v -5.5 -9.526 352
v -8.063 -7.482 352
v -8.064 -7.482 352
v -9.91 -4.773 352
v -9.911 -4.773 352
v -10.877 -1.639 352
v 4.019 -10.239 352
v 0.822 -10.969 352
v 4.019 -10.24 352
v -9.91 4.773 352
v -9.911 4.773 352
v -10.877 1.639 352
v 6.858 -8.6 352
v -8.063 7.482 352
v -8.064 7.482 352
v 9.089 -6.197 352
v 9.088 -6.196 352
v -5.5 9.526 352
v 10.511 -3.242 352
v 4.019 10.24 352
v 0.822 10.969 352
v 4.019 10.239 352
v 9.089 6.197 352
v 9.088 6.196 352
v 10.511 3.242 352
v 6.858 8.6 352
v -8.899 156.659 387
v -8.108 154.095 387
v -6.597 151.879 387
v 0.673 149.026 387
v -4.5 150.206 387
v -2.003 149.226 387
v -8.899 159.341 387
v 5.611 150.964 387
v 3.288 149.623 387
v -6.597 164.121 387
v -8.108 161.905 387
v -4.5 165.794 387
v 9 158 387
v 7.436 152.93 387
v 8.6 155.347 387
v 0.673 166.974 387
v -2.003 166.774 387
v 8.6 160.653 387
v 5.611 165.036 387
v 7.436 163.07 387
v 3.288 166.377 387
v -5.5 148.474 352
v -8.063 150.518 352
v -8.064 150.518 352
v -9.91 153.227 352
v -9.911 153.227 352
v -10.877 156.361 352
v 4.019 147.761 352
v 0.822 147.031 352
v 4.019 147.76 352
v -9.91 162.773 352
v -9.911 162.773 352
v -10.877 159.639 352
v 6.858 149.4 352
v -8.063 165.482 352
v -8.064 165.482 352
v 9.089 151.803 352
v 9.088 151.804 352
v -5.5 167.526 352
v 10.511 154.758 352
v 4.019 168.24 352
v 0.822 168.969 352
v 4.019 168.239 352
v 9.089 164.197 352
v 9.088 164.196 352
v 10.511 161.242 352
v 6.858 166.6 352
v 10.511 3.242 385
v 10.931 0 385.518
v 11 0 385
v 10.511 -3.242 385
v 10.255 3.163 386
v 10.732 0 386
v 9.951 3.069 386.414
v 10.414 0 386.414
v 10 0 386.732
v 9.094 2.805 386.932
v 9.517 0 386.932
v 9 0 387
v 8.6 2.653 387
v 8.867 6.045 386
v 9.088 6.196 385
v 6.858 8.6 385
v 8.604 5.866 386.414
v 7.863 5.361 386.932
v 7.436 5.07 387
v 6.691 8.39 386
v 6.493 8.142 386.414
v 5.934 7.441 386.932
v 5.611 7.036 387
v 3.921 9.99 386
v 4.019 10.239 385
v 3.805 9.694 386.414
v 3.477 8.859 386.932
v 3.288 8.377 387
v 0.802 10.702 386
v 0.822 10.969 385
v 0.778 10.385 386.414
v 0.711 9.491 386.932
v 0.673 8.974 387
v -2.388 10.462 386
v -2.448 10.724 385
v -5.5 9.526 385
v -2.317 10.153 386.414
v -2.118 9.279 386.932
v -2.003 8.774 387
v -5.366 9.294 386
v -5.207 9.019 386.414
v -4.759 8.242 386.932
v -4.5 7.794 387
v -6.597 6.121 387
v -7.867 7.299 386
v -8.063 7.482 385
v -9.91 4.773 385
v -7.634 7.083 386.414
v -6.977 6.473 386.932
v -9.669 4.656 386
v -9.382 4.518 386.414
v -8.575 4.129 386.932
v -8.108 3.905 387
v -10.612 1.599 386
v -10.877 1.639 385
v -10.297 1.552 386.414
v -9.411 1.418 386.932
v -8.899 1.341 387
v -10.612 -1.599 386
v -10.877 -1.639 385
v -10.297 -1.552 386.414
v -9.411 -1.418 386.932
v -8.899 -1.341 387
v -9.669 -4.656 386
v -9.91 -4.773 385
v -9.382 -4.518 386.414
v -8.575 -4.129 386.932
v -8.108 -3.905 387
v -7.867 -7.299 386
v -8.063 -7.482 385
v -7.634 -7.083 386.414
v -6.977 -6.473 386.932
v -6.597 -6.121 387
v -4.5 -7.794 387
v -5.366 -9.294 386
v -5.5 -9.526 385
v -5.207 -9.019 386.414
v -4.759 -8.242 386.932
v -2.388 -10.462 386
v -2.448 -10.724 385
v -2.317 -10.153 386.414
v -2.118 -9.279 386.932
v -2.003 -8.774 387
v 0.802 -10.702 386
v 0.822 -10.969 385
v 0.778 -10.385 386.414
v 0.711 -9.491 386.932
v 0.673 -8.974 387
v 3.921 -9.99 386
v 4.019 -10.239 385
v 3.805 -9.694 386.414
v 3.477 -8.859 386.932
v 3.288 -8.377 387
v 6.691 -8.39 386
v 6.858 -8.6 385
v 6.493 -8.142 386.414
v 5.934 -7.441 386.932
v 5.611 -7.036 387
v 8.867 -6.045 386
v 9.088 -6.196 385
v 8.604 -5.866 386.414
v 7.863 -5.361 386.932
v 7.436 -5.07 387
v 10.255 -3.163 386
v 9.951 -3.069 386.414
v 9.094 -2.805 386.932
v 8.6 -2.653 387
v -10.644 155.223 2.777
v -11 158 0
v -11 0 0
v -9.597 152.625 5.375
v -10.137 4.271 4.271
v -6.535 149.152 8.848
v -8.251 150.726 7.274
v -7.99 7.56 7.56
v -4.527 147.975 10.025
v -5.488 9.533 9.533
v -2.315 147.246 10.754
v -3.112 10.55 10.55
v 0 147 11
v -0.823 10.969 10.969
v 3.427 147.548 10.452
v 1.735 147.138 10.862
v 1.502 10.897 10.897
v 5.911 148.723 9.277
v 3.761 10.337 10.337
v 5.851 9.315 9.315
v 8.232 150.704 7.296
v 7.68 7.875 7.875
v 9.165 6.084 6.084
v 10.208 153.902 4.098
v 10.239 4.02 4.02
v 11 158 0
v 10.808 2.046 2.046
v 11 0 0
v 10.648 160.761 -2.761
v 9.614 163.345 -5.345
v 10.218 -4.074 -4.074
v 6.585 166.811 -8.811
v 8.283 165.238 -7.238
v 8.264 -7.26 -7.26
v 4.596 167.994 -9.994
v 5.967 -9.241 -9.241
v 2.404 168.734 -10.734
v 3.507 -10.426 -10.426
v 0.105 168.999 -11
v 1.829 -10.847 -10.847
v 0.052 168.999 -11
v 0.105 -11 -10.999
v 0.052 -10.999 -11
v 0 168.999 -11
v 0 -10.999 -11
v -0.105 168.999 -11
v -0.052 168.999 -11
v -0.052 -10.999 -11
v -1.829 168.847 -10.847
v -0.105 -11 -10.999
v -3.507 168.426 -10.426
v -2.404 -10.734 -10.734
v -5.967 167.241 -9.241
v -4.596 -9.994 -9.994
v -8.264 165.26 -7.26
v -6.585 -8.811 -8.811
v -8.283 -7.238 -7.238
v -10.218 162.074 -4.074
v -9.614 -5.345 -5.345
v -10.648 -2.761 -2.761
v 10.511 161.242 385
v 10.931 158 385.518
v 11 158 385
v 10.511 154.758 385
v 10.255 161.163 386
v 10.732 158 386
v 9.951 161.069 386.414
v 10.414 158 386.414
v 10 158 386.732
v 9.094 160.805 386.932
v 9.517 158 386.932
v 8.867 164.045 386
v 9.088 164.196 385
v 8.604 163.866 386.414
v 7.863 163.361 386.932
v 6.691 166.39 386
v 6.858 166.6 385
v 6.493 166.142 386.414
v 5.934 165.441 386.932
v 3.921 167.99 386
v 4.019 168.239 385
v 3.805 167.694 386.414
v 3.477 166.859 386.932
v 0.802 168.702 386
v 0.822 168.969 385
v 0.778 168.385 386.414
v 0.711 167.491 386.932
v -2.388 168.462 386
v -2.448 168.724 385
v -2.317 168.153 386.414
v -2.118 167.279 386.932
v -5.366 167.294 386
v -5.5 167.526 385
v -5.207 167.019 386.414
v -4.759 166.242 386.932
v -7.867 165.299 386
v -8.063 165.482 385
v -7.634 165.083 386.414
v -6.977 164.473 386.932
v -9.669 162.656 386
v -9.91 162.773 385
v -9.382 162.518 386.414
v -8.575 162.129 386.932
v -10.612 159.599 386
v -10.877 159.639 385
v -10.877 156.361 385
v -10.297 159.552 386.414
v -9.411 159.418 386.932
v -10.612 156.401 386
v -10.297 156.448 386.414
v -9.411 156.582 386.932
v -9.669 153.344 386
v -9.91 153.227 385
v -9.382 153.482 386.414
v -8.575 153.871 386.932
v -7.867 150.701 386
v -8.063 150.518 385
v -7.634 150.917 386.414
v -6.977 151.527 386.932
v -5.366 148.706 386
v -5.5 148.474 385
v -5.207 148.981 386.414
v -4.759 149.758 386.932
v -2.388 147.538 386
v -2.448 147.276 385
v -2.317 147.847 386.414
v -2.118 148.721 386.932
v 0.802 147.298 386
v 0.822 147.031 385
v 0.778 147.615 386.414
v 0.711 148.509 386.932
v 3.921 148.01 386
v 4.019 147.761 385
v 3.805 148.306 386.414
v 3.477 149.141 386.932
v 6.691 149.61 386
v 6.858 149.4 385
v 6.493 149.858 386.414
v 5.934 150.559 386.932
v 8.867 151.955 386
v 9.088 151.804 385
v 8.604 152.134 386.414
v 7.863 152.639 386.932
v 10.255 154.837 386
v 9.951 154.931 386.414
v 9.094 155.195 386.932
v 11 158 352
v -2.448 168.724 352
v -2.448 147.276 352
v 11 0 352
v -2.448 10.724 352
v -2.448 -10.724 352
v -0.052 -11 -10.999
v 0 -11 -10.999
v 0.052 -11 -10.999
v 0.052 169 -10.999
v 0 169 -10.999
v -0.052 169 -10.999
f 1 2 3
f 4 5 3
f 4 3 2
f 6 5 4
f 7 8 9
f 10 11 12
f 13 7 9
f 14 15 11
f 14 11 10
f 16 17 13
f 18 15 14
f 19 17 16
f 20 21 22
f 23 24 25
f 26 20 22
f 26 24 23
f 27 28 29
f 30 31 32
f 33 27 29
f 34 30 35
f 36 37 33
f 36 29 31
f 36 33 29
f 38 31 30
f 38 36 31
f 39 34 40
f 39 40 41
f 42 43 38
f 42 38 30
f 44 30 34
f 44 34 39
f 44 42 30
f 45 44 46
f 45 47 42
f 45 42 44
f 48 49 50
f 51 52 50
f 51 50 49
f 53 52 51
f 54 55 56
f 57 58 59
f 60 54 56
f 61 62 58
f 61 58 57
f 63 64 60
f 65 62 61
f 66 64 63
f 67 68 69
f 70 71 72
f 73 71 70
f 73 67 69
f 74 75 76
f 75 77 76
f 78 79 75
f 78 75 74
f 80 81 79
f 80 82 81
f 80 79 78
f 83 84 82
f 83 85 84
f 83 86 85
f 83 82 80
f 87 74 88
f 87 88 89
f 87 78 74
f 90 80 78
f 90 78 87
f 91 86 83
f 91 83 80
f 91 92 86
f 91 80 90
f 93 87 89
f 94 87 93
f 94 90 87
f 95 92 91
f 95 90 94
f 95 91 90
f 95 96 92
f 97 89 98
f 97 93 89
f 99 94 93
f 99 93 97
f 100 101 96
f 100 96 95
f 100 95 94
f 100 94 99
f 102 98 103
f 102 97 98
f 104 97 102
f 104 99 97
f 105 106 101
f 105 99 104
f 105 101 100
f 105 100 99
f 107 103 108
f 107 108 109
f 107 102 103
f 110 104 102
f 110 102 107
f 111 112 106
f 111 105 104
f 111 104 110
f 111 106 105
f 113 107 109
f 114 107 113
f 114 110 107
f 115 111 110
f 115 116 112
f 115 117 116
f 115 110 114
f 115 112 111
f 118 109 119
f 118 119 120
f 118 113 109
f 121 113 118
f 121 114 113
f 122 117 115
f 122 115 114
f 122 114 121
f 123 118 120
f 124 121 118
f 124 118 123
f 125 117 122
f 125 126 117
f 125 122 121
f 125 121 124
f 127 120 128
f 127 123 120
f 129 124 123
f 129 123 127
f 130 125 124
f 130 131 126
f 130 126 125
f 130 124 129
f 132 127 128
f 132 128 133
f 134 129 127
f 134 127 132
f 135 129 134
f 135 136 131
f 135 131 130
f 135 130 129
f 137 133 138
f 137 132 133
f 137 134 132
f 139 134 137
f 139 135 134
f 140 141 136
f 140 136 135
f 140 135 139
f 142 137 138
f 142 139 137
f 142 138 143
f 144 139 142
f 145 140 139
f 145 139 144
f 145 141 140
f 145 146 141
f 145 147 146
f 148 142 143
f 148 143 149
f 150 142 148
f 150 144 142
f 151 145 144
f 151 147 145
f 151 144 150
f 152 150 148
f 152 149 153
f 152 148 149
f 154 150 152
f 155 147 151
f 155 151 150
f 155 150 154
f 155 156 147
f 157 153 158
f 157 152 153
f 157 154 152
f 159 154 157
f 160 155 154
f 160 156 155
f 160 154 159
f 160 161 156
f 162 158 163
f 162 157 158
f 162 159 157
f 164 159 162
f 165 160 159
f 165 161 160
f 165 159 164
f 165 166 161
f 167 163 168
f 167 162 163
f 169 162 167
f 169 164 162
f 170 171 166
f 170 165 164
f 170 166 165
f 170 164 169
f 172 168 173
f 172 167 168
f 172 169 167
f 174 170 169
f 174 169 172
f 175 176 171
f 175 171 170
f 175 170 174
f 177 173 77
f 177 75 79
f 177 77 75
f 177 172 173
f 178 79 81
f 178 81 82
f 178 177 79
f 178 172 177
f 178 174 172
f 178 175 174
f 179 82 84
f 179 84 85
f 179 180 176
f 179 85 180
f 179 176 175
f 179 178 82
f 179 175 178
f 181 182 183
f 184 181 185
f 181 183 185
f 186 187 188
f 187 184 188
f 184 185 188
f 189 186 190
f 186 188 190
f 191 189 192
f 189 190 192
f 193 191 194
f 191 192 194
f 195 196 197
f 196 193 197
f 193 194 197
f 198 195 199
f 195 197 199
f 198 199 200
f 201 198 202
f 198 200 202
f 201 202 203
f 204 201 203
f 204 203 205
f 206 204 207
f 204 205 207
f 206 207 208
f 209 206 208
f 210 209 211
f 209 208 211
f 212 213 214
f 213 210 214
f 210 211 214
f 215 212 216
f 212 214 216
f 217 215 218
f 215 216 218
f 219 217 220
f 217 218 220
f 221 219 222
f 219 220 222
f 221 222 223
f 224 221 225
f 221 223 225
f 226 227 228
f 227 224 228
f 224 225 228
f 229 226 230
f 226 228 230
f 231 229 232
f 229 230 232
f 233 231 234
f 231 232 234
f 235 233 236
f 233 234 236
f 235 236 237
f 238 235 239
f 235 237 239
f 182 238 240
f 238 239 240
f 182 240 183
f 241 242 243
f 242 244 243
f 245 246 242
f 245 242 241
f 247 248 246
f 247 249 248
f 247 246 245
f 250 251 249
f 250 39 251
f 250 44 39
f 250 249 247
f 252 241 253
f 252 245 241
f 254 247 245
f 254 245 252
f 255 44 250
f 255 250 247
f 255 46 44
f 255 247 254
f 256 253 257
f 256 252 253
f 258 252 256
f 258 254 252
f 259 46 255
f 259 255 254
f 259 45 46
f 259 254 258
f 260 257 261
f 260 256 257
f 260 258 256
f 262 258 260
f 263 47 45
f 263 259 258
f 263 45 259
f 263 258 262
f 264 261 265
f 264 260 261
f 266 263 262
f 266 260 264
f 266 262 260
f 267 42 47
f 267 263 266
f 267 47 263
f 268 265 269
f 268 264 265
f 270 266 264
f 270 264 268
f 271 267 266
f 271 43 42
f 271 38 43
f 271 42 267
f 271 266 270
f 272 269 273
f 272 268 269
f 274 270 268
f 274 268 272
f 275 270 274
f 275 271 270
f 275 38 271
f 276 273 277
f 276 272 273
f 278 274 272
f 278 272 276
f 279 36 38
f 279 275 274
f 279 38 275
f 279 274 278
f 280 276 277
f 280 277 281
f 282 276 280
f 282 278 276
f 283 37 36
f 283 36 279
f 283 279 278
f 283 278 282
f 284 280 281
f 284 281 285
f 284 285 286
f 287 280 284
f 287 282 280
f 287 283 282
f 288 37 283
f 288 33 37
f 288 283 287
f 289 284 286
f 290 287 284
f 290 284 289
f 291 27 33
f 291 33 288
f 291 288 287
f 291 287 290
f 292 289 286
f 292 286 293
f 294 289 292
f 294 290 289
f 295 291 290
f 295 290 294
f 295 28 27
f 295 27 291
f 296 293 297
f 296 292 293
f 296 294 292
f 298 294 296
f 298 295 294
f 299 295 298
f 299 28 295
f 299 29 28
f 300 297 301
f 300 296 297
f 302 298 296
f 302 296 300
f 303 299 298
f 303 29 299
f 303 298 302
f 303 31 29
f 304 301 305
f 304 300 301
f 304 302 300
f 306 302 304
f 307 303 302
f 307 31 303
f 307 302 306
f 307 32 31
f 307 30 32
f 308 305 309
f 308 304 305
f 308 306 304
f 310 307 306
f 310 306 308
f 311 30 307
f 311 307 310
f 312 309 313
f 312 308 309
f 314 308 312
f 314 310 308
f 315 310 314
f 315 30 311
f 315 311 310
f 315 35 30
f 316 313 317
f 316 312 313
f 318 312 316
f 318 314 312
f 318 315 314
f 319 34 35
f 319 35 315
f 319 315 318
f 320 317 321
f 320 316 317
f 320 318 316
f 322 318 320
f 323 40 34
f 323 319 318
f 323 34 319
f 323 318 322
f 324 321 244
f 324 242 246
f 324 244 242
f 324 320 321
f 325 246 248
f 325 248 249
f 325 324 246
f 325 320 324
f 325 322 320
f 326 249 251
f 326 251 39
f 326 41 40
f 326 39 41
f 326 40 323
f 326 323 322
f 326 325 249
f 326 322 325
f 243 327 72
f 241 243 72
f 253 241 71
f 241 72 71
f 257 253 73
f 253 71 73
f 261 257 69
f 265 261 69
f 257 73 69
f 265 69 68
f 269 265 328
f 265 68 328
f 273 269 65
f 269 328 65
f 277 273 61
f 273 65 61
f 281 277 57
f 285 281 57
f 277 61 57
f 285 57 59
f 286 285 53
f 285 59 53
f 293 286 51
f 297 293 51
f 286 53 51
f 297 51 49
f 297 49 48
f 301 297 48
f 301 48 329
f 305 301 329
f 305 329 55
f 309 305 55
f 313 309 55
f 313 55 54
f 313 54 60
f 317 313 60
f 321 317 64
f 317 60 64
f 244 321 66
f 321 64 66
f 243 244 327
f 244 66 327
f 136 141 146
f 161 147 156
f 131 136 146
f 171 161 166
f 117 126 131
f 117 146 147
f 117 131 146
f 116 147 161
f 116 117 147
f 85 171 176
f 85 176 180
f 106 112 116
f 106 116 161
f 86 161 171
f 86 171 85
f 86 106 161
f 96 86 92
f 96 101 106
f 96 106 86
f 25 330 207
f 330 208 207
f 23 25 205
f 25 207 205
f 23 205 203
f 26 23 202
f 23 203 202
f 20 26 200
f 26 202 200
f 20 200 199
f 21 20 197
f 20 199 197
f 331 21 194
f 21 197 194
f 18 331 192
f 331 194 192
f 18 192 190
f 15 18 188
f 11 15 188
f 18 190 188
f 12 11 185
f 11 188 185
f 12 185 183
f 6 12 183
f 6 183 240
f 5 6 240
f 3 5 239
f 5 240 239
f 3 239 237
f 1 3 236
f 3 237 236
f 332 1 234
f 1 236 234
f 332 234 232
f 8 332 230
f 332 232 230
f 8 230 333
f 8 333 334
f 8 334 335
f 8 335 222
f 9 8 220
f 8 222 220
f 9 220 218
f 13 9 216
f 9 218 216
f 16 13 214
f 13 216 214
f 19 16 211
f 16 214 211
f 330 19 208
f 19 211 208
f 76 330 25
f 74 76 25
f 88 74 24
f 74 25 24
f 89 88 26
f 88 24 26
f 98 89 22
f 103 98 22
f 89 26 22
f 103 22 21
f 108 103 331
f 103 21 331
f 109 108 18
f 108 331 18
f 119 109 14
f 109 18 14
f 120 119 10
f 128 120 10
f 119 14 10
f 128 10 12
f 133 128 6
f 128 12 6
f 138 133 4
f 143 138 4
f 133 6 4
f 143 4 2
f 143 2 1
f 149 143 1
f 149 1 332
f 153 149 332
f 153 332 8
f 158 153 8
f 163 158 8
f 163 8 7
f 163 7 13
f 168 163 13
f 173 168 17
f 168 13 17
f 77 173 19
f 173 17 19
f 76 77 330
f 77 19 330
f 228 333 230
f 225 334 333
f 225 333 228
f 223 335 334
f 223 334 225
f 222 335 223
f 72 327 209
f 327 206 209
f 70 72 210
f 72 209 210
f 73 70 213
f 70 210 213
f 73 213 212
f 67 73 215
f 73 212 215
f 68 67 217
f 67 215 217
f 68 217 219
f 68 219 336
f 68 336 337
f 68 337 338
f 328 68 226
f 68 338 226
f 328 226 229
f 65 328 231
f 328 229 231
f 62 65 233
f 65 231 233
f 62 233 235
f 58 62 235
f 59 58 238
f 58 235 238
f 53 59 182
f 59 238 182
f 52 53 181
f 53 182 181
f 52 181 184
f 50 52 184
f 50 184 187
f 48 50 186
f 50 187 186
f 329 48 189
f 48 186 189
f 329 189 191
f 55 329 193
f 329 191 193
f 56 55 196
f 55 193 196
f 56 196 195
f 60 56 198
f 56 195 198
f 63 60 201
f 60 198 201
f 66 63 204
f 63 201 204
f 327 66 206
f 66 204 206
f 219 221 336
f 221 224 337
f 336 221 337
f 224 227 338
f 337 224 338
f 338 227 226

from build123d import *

# Parameters (mm, degrees)
SKETCH_1_R                 = 11
EXTRUDE_1_DEPTH            = 352
SKETCH_2_R                 = 11
EXTRUDE_2_DEPTH            = 158
PATTERN_LINEAR_1_OUTLINE_R = 11
PATTERN_LINEAR_1_DEPTH     = 352
SKETCH_3_R                 = 10.9995
EXTRUDE_3_DEPTH            = 35
CHAMFER_1_SIZE             = 21.999
FILLET_1_R                 = 2


with BuildPart() as part:
    # 草图1 → 拉伸1 (new body)
    with BuildSketch(Plane.XY):
        Circle(SKETCH_1_R)
    extrude(amount=EXTRUDE_1_DEPTH)

    # 草图2 → 拉伸2 (add)
    with BuildSketch(Plane(origin=(0, 0, 0), x_dir=(1, 0, 0), z_dir=(0, 1, 0))):
        with Locations(Location((0, 0, 0), (0, 0, 180))):
            Circle(SKETCH_2_R)
    extrude(amount=EXTRUDE_2_DEPTH)


with BuildPart() as pattern_linear_1_tool:
    # 阵列(线性)1: read off the stored shape, not the designer's step
    # 阵列(线性)1 outline → 阵列(线性)1 (new body)
    with BuildSketch(Plane.XY):
        with Locations((0, 158)):
            Circle(PATTERN_LINEAR_1_OUTLINE_R)
    extrude(amount=PATTERN_LINEAR_1_DEPTH)


with BuildPart() as part_1:
    add(part.part)


with BuildPart() as part_2:
    # 阵列(线性)1: joined with pattern_linear_1_tool
    add(part_1.part.fuse(pattern_linear_1_tool.part, tol=0.00001))

    # 草图3 → 拉伸3 (add)
    with BuildSketch(Plane.XY.offset(352)):
        with Locations((0, 158)):
            Circle(SKETCH_3_R)
        Circle(SKETCH_3_R)
    extrude(amount=EXTRUDE_3_DEPTH)

    # 倒角1
    # the kernel refuses this chamfer: 21.999 mm, written as the material it adds along each edge
    with BuildSketch(Plane(origin=(67.574454052, 0, 0), x_dir=(0, -1, 0), z_dir=(-1, 0, 0))) as chamfer_1_piece_1_section:
        Polygon((CHAMFER_1_SIZE, 0), (0, -CHAMFER_1_SIZE), (0, 0), align=None)
    chamfer_1_piece_1 = extrude(amount=135.148908105, mode=Mode.PRIVATE)
    chamfer_1_piece_1 = chamfer_1_piece_1 & Plane(origin=(0, 0, 0), x_dir=(1, 0, 0), z_dir=(0, 0, -1)) * Cylinder(11, 359, mode=Mode.PRIVATE)
    chamfer_1_piece_1 = chamfer_1_piece_1 & Plane(origin=(0, 0, 0), x_dir=(-1, 0, 0), z_dir=(0, -1, 0)) * Cylinder(11, 359, mode=Mode.PRIVATE)
    add(chamfer_1_piece_1)
    with BuildSketch(Plane(origin=(-67.574454052, 158, 0), x_dir=(0, 0, -1), z_dir=(1, 0, 0))) as chamfer_1_piece_2_section:
        Polygon((CHAMFER_1_SIZE, 0), (0, CHAMFER_1_SIZE), (0, 0), align=None)
    chamfer_1_piece_2 = extrude(amount=135.148908105, mode=Mode.PRIVATE)
    chamfer_1_piece_2 = chamfer_1_piece_2 & Plane(origin=(0, 158, 0), x_dir=(-1, 0, 0), z_dir=(0, -1, 0)) * Cylinder(11, 359, mode=Mode.PRIVATE)
    chamfer_1_piece_2 = chamfer_1_piece_2 & Plane(origin=(0, 158, 0), x_dir=(1, 0, 0), z_dir=(0, 0, -1)) * Cylinder(11, 359, mode=Mode.PRIVATE)
    add(chamfer_1_piece_2)

    # 圆角1
    fillet_1_edges = [part_2.edges().sort_by_distance(p)[0] for p in [
        (-10.9995, 158, 387),
        (-10.9995, 0, 387),
    ]]
    fillet(fillet_1_edges, radius=FILLET_1_R)


solid = part_2.part
